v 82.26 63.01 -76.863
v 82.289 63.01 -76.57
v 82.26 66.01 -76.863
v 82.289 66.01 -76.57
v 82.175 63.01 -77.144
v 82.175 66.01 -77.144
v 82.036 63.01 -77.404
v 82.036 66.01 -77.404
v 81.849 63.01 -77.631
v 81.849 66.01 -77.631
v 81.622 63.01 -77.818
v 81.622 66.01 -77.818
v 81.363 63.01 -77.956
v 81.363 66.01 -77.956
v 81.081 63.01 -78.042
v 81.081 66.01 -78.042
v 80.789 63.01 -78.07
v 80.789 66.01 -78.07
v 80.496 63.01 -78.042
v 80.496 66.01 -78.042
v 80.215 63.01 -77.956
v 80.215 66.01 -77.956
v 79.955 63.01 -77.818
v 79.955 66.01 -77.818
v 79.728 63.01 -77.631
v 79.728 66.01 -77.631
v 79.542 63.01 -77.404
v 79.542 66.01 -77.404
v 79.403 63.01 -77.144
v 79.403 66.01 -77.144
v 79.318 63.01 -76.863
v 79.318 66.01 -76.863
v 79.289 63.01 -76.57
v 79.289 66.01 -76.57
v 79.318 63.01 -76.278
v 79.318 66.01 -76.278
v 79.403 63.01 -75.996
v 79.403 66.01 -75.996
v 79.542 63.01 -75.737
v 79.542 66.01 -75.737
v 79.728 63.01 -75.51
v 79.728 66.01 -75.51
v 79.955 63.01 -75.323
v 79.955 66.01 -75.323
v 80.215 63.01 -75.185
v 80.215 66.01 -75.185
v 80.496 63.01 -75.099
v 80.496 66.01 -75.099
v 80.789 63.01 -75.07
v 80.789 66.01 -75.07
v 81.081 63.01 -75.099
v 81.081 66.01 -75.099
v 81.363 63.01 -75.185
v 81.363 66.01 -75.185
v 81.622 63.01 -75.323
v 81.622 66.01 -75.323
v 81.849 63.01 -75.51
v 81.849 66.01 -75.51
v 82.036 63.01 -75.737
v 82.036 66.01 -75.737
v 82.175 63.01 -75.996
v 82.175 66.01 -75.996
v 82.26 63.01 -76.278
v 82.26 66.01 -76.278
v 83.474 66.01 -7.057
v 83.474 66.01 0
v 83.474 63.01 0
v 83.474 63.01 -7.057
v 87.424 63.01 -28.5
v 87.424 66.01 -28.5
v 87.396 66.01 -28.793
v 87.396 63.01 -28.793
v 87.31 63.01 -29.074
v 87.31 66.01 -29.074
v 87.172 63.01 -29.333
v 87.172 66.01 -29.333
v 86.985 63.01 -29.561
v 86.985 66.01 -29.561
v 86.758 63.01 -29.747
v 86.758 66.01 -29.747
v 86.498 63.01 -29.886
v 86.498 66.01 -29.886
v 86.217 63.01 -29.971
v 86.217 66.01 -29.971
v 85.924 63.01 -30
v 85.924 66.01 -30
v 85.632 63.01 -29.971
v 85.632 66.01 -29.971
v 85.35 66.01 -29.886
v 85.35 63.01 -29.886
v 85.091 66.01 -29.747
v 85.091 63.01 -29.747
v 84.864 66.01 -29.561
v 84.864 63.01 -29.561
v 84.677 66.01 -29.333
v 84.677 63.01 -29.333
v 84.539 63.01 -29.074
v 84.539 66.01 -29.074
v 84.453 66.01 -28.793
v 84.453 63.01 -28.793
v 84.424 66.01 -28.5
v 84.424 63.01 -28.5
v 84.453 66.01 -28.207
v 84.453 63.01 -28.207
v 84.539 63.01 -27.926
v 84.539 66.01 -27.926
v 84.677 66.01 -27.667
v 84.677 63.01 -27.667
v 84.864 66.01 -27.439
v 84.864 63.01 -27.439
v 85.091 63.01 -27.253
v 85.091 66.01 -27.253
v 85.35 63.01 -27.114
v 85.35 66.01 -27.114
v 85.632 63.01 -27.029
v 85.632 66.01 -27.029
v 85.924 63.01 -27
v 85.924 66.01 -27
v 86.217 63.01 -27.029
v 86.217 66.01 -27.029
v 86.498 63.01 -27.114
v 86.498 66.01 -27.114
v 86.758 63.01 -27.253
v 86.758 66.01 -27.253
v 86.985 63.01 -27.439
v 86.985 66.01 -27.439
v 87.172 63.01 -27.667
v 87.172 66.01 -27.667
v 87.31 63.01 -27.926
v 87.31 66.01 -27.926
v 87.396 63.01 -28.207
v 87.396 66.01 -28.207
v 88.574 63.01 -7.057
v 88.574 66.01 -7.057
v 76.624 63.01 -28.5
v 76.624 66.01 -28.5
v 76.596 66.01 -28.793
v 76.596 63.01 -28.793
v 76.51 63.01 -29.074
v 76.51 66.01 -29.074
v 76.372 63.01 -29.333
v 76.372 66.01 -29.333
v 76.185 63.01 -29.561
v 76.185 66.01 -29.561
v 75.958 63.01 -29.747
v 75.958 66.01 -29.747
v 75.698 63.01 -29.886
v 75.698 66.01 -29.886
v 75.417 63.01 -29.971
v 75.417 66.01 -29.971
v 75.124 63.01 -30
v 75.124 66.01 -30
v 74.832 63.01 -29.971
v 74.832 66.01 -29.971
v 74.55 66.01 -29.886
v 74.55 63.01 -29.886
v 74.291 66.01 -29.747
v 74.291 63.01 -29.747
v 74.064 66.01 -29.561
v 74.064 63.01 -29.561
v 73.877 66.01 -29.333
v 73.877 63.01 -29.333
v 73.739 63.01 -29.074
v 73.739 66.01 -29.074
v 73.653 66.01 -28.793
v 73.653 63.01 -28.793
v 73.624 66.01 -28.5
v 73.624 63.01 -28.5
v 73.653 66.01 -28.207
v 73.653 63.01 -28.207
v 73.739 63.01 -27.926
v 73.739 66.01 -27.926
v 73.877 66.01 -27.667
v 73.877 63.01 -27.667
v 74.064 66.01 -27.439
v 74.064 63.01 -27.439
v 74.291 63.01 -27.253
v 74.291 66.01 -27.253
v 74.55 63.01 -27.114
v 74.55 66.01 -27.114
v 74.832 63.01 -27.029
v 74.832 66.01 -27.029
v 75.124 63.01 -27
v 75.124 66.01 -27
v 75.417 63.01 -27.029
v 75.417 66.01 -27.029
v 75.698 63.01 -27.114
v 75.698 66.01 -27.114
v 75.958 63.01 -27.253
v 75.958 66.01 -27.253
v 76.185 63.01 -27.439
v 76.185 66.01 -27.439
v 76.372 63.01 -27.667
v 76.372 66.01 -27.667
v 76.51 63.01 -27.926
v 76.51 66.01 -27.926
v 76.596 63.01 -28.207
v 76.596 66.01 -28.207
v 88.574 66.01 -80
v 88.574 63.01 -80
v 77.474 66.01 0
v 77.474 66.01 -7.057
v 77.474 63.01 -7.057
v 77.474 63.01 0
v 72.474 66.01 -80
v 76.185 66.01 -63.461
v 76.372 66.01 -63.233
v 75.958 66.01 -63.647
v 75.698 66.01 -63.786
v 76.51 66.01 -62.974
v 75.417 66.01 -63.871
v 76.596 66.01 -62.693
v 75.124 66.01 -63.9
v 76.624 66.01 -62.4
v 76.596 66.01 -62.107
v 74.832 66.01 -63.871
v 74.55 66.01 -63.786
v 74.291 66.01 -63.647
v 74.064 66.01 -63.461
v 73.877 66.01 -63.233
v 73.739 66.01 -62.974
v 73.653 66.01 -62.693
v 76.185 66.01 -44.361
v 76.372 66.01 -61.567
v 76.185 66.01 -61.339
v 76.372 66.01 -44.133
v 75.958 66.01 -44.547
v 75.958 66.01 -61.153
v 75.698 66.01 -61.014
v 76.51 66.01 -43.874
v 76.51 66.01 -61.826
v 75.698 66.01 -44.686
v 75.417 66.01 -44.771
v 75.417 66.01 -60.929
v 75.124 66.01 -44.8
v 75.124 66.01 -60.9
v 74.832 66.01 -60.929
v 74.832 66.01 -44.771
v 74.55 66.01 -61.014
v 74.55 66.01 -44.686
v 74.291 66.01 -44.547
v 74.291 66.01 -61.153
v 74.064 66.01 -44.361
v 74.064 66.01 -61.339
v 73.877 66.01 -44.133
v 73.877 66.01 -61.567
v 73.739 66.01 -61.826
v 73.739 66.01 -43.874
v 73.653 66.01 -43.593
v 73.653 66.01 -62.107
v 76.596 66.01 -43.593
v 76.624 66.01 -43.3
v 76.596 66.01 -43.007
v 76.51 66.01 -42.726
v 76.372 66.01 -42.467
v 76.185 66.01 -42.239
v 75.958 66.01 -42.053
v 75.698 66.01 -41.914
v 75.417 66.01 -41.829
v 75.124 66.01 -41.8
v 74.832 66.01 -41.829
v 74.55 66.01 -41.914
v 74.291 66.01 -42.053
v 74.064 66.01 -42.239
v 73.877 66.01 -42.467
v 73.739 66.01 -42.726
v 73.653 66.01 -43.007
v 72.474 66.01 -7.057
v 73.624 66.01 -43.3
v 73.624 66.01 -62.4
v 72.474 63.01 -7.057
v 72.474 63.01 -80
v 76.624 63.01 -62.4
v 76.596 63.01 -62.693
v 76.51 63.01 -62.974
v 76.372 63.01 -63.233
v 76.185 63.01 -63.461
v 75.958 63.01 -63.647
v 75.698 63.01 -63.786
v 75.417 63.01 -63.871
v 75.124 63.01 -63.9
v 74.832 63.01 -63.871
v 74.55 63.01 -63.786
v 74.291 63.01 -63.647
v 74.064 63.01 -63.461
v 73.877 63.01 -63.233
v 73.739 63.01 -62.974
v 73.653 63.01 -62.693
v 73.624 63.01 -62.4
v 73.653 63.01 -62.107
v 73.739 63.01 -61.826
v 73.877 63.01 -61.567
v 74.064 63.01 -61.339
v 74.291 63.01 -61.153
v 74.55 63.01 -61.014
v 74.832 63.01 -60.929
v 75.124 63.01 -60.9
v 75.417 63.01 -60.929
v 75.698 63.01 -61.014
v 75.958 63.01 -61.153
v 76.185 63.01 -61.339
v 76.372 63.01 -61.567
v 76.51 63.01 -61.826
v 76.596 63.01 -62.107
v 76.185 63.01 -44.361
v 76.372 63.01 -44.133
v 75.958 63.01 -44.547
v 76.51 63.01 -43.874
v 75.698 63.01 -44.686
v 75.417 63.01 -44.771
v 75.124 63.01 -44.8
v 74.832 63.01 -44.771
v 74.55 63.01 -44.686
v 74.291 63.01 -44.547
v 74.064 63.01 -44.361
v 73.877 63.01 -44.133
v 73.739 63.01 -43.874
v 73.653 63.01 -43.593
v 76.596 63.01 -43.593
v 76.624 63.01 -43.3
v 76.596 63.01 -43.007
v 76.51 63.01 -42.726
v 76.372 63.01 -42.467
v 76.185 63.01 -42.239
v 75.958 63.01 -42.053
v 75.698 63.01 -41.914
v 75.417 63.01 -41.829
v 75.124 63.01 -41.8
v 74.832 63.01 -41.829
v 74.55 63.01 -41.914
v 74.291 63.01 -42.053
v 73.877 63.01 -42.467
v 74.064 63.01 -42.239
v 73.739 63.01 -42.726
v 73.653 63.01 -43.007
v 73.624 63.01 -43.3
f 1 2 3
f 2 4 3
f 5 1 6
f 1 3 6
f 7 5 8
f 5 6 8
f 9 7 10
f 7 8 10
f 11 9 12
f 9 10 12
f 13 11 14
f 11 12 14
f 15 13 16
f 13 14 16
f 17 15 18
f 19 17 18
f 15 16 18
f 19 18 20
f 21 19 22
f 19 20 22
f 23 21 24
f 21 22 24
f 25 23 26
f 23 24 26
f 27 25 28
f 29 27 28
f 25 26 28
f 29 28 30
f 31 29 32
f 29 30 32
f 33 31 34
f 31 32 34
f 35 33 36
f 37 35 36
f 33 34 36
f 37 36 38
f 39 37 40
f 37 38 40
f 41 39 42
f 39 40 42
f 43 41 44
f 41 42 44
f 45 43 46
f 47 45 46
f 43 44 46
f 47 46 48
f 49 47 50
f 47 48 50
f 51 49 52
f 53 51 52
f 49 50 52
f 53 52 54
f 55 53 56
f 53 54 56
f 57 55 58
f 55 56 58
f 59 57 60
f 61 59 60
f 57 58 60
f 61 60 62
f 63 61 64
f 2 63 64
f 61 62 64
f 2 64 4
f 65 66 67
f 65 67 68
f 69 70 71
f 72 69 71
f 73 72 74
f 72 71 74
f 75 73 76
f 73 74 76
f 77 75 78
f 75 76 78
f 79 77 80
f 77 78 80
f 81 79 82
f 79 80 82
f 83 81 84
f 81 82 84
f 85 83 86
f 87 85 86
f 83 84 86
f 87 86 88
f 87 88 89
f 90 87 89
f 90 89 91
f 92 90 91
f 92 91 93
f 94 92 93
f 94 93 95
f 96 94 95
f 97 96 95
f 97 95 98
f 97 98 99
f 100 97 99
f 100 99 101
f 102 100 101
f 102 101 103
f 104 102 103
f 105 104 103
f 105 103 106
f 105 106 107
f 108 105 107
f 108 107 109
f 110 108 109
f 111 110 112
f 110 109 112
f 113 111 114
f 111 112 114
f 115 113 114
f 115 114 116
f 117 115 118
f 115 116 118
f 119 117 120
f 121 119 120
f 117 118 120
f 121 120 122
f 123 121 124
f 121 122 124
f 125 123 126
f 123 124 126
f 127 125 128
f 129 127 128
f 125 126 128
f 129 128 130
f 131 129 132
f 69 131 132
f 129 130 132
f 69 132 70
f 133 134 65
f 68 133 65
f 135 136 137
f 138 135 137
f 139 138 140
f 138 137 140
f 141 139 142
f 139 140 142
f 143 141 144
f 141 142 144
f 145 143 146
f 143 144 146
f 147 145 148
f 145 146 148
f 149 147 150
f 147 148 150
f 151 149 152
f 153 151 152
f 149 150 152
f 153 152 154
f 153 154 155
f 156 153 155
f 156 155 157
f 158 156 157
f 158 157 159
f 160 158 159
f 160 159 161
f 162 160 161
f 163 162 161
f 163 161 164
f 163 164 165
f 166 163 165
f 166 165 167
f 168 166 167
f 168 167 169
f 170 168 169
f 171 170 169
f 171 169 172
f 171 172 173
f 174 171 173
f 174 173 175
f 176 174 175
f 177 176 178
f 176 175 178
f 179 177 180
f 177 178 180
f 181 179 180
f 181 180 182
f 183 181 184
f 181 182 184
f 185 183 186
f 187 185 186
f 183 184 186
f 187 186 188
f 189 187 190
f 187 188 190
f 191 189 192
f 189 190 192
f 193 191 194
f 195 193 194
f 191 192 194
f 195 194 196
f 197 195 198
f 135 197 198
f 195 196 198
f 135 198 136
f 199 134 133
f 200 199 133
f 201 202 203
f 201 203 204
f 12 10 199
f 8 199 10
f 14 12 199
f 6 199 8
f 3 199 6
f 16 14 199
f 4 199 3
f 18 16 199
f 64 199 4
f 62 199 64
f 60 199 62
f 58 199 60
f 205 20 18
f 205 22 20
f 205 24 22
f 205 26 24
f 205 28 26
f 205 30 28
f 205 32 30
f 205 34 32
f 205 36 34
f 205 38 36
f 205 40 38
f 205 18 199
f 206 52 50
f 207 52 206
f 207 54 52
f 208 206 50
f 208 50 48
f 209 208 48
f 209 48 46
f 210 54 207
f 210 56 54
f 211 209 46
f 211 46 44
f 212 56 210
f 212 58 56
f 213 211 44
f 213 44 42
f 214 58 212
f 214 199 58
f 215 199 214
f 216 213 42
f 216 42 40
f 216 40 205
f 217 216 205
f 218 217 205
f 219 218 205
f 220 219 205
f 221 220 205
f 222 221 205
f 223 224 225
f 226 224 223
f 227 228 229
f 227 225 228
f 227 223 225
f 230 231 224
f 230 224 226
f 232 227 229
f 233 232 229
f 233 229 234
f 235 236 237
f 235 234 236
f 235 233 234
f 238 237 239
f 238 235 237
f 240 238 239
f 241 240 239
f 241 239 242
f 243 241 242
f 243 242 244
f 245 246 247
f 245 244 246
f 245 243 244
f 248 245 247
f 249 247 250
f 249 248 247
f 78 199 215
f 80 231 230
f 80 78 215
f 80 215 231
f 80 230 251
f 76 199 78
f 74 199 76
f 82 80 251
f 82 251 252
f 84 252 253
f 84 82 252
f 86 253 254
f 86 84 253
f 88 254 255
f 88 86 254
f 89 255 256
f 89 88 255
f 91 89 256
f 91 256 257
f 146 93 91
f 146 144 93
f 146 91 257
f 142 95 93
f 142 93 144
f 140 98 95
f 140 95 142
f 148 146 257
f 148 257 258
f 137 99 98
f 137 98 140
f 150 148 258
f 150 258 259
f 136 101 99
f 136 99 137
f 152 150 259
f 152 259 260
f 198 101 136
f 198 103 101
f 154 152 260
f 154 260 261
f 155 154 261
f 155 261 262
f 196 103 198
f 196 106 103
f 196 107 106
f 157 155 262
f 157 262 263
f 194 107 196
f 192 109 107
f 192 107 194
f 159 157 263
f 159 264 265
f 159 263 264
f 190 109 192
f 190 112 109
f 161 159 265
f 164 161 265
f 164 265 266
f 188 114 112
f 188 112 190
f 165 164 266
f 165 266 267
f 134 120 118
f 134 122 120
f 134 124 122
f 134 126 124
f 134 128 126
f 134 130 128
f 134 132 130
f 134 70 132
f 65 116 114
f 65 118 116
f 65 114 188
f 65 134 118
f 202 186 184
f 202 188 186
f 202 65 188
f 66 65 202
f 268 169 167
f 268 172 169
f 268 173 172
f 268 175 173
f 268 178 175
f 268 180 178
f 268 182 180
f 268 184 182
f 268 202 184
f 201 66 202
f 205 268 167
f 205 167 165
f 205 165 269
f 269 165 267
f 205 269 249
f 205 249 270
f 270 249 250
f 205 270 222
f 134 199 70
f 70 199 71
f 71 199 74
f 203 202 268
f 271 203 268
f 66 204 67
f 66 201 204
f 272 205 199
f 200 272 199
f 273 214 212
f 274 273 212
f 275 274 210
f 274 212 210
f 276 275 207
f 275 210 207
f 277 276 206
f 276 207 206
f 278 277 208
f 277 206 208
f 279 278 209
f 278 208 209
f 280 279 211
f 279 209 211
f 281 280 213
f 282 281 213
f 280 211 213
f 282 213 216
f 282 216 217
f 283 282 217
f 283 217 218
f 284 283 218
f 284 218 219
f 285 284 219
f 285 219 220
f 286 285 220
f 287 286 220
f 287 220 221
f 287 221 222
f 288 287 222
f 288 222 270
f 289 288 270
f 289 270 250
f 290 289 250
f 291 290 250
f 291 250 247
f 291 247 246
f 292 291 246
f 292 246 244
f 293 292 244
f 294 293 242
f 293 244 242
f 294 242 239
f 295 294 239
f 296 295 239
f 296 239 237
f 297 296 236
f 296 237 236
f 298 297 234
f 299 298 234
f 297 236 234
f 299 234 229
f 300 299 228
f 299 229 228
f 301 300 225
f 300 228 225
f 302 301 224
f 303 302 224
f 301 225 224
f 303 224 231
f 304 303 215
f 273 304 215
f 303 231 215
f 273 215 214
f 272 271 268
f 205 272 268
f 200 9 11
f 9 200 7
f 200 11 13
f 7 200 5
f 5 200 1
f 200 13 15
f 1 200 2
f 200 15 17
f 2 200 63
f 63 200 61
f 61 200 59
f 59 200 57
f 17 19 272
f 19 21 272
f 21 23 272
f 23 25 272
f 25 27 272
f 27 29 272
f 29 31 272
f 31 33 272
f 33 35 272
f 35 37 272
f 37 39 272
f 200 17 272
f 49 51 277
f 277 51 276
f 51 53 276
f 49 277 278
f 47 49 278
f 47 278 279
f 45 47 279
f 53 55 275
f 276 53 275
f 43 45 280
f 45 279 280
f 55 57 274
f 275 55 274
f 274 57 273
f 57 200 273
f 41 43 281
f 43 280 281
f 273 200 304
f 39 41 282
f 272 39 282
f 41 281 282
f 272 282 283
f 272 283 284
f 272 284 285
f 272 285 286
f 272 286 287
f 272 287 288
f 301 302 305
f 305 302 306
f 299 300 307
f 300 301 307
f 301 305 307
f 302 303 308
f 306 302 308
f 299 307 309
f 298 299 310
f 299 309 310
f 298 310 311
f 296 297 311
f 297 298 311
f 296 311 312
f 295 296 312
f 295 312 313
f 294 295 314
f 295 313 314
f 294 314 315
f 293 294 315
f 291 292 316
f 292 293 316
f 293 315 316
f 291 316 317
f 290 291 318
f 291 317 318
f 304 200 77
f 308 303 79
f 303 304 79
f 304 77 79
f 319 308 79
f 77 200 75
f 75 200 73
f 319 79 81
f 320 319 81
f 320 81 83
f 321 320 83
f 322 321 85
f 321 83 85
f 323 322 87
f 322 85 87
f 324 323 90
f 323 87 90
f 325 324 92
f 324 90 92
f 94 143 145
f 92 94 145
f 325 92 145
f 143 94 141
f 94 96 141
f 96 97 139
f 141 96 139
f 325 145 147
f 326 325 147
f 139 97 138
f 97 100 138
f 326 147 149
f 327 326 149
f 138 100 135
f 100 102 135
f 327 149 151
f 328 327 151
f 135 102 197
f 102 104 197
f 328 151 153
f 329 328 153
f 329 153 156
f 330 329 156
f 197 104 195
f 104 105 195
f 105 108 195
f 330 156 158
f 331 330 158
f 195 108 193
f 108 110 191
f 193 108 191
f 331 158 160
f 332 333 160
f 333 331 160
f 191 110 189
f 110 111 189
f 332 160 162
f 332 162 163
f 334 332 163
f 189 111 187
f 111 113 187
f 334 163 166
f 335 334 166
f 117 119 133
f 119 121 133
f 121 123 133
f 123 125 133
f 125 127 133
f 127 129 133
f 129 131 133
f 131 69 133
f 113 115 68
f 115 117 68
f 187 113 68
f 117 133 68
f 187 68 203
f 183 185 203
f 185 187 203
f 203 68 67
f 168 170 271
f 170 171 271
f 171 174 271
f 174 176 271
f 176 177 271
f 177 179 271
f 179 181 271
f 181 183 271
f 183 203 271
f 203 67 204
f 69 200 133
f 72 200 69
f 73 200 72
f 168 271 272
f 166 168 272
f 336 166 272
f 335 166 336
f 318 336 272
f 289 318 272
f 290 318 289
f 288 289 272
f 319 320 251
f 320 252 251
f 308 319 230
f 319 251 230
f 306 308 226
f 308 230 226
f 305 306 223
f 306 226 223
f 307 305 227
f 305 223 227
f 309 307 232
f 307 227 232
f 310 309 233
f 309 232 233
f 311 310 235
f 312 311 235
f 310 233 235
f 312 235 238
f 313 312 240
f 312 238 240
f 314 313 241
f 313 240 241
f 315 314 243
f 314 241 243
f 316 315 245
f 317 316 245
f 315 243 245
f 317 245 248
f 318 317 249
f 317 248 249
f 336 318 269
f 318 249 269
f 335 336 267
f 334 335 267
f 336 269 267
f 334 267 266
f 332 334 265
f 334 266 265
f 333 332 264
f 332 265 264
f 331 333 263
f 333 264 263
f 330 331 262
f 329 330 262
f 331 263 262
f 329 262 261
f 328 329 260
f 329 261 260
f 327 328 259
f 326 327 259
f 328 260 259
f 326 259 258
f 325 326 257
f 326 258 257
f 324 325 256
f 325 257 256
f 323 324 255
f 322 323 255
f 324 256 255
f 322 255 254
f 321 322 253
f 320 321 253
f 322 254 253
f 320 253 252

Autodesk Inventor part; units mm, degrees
ref_plane "YZ Plane" through (0, 0, 0) normal (1, 0, 0) x (0, 1, 0)
ref_plane "XZ Plane" through (0, 0, 0) normal (0, 1, 0) x (-1, 0, 0)
ref_plane "XY Plane" through (0, 0, 0) normal (0, 0, 1) x (1, 0, 0)
ref_plane "Work Plane1" through (0, 0, 0) normal (0, 0, 1) x (1, 0, 0)
sketch "Sketch1" plane through (0, 0, 0) normal (0, 0, 1) x (1, 0, 0)
  line L0 (88.5744, 66.01) -> (72.4744, 66.01) projected
  line L1 (72.4744, 66.01) -> (88.5744, 66.01)
  line L2 (88.5744, 66.01) -> (88.5744, 63.01)
  line L3 (88.5744, 63.01) -> (72.4744, 63.01)
  line L4 (72.4744, 63.01) -> (72.4744, 66.01)
  point P0 (0, 0)
  dimension "d0" = 3
extrude "Extrusion1" add sketch "Sketch1" against normal blind 80
sketch "Sketch2" plane through (72.4744, 66.01, 0) normal (0, 1, 0) x (1, 0, 0)
  circle A0 centre (2.65, 28.5) radius 1.5 projected
  circle A1 centre (13.45, 28.5) radius 1.5 projected
  circle A2 centre (2.65, 43.3) radius 1.5 projected
  circle A3 centre (2.65, 62.4) radius 1.5 projected
  point P0 (-72.4744, 0)
extrude "Extrusion2" cut sketch "Sketch2" against normal blind 80
ref_plane "Work Plane2" through (0, 0, 0) normal (0, 0, 1) x (1, 0, 0)
sketch "Sketch3" plane through (0, 0, 0) normal (0, 0, 1) x (1, 0, 0)
  point P0 (0, 0)
sketch "Sketch4" plane through (72.4744, 66.01, 0) normal (0, 1, 0) x (1, 0, 0)
  line L0 (0, 0) -> (16.1, 0) projected
  line L1 (5, 0) -> (11, 0)
  line L2 (11, 0) -> (11, 7.0573)
  line L3 (11, 7.0573) -> (5, 7.0573)
  line L4 (5, 7.0573) -> (5, 0)
  line L5 (0, 0) -> (0, 80) projected
  line L6 (0, 0) -> (0, 80) projected
  line L7 (0, 0) -> (16.1, 0)
  line L8 (16.1, 0) -> (16.1, 7.0573)
  line L9 (16.1, 7.0573) -> (0, 7.0573)
  line L10 (0, 7.0573) -> (0, 0)
  point P0 (-72.4744, 0)
  point P1 (11, 7.0573)
  point P2 (11, 0)
  point P3 (5, 7.0573)
  dimension "d5" = 6
  dimension "d6" = 5
extrude "Extrusion3" cut sketch "Sketch4" against normal blind 80 contours L5 L9 L4 L0 | L2 L9 L8 L0
sketch "Sketch5" plane through (72.4744, 66.01, -80) normal (0, 1, 0) x (1, 0, 0)
  circle A0 centre (8.3144, -3.4296) radius 1.5
  point P0 (-72.4744, -80)
  dimension "d9" = 3
extrude "Extrusion4" cut sketch "Sketch5" against normal blind 80
properties part number "thanhdolimit"
